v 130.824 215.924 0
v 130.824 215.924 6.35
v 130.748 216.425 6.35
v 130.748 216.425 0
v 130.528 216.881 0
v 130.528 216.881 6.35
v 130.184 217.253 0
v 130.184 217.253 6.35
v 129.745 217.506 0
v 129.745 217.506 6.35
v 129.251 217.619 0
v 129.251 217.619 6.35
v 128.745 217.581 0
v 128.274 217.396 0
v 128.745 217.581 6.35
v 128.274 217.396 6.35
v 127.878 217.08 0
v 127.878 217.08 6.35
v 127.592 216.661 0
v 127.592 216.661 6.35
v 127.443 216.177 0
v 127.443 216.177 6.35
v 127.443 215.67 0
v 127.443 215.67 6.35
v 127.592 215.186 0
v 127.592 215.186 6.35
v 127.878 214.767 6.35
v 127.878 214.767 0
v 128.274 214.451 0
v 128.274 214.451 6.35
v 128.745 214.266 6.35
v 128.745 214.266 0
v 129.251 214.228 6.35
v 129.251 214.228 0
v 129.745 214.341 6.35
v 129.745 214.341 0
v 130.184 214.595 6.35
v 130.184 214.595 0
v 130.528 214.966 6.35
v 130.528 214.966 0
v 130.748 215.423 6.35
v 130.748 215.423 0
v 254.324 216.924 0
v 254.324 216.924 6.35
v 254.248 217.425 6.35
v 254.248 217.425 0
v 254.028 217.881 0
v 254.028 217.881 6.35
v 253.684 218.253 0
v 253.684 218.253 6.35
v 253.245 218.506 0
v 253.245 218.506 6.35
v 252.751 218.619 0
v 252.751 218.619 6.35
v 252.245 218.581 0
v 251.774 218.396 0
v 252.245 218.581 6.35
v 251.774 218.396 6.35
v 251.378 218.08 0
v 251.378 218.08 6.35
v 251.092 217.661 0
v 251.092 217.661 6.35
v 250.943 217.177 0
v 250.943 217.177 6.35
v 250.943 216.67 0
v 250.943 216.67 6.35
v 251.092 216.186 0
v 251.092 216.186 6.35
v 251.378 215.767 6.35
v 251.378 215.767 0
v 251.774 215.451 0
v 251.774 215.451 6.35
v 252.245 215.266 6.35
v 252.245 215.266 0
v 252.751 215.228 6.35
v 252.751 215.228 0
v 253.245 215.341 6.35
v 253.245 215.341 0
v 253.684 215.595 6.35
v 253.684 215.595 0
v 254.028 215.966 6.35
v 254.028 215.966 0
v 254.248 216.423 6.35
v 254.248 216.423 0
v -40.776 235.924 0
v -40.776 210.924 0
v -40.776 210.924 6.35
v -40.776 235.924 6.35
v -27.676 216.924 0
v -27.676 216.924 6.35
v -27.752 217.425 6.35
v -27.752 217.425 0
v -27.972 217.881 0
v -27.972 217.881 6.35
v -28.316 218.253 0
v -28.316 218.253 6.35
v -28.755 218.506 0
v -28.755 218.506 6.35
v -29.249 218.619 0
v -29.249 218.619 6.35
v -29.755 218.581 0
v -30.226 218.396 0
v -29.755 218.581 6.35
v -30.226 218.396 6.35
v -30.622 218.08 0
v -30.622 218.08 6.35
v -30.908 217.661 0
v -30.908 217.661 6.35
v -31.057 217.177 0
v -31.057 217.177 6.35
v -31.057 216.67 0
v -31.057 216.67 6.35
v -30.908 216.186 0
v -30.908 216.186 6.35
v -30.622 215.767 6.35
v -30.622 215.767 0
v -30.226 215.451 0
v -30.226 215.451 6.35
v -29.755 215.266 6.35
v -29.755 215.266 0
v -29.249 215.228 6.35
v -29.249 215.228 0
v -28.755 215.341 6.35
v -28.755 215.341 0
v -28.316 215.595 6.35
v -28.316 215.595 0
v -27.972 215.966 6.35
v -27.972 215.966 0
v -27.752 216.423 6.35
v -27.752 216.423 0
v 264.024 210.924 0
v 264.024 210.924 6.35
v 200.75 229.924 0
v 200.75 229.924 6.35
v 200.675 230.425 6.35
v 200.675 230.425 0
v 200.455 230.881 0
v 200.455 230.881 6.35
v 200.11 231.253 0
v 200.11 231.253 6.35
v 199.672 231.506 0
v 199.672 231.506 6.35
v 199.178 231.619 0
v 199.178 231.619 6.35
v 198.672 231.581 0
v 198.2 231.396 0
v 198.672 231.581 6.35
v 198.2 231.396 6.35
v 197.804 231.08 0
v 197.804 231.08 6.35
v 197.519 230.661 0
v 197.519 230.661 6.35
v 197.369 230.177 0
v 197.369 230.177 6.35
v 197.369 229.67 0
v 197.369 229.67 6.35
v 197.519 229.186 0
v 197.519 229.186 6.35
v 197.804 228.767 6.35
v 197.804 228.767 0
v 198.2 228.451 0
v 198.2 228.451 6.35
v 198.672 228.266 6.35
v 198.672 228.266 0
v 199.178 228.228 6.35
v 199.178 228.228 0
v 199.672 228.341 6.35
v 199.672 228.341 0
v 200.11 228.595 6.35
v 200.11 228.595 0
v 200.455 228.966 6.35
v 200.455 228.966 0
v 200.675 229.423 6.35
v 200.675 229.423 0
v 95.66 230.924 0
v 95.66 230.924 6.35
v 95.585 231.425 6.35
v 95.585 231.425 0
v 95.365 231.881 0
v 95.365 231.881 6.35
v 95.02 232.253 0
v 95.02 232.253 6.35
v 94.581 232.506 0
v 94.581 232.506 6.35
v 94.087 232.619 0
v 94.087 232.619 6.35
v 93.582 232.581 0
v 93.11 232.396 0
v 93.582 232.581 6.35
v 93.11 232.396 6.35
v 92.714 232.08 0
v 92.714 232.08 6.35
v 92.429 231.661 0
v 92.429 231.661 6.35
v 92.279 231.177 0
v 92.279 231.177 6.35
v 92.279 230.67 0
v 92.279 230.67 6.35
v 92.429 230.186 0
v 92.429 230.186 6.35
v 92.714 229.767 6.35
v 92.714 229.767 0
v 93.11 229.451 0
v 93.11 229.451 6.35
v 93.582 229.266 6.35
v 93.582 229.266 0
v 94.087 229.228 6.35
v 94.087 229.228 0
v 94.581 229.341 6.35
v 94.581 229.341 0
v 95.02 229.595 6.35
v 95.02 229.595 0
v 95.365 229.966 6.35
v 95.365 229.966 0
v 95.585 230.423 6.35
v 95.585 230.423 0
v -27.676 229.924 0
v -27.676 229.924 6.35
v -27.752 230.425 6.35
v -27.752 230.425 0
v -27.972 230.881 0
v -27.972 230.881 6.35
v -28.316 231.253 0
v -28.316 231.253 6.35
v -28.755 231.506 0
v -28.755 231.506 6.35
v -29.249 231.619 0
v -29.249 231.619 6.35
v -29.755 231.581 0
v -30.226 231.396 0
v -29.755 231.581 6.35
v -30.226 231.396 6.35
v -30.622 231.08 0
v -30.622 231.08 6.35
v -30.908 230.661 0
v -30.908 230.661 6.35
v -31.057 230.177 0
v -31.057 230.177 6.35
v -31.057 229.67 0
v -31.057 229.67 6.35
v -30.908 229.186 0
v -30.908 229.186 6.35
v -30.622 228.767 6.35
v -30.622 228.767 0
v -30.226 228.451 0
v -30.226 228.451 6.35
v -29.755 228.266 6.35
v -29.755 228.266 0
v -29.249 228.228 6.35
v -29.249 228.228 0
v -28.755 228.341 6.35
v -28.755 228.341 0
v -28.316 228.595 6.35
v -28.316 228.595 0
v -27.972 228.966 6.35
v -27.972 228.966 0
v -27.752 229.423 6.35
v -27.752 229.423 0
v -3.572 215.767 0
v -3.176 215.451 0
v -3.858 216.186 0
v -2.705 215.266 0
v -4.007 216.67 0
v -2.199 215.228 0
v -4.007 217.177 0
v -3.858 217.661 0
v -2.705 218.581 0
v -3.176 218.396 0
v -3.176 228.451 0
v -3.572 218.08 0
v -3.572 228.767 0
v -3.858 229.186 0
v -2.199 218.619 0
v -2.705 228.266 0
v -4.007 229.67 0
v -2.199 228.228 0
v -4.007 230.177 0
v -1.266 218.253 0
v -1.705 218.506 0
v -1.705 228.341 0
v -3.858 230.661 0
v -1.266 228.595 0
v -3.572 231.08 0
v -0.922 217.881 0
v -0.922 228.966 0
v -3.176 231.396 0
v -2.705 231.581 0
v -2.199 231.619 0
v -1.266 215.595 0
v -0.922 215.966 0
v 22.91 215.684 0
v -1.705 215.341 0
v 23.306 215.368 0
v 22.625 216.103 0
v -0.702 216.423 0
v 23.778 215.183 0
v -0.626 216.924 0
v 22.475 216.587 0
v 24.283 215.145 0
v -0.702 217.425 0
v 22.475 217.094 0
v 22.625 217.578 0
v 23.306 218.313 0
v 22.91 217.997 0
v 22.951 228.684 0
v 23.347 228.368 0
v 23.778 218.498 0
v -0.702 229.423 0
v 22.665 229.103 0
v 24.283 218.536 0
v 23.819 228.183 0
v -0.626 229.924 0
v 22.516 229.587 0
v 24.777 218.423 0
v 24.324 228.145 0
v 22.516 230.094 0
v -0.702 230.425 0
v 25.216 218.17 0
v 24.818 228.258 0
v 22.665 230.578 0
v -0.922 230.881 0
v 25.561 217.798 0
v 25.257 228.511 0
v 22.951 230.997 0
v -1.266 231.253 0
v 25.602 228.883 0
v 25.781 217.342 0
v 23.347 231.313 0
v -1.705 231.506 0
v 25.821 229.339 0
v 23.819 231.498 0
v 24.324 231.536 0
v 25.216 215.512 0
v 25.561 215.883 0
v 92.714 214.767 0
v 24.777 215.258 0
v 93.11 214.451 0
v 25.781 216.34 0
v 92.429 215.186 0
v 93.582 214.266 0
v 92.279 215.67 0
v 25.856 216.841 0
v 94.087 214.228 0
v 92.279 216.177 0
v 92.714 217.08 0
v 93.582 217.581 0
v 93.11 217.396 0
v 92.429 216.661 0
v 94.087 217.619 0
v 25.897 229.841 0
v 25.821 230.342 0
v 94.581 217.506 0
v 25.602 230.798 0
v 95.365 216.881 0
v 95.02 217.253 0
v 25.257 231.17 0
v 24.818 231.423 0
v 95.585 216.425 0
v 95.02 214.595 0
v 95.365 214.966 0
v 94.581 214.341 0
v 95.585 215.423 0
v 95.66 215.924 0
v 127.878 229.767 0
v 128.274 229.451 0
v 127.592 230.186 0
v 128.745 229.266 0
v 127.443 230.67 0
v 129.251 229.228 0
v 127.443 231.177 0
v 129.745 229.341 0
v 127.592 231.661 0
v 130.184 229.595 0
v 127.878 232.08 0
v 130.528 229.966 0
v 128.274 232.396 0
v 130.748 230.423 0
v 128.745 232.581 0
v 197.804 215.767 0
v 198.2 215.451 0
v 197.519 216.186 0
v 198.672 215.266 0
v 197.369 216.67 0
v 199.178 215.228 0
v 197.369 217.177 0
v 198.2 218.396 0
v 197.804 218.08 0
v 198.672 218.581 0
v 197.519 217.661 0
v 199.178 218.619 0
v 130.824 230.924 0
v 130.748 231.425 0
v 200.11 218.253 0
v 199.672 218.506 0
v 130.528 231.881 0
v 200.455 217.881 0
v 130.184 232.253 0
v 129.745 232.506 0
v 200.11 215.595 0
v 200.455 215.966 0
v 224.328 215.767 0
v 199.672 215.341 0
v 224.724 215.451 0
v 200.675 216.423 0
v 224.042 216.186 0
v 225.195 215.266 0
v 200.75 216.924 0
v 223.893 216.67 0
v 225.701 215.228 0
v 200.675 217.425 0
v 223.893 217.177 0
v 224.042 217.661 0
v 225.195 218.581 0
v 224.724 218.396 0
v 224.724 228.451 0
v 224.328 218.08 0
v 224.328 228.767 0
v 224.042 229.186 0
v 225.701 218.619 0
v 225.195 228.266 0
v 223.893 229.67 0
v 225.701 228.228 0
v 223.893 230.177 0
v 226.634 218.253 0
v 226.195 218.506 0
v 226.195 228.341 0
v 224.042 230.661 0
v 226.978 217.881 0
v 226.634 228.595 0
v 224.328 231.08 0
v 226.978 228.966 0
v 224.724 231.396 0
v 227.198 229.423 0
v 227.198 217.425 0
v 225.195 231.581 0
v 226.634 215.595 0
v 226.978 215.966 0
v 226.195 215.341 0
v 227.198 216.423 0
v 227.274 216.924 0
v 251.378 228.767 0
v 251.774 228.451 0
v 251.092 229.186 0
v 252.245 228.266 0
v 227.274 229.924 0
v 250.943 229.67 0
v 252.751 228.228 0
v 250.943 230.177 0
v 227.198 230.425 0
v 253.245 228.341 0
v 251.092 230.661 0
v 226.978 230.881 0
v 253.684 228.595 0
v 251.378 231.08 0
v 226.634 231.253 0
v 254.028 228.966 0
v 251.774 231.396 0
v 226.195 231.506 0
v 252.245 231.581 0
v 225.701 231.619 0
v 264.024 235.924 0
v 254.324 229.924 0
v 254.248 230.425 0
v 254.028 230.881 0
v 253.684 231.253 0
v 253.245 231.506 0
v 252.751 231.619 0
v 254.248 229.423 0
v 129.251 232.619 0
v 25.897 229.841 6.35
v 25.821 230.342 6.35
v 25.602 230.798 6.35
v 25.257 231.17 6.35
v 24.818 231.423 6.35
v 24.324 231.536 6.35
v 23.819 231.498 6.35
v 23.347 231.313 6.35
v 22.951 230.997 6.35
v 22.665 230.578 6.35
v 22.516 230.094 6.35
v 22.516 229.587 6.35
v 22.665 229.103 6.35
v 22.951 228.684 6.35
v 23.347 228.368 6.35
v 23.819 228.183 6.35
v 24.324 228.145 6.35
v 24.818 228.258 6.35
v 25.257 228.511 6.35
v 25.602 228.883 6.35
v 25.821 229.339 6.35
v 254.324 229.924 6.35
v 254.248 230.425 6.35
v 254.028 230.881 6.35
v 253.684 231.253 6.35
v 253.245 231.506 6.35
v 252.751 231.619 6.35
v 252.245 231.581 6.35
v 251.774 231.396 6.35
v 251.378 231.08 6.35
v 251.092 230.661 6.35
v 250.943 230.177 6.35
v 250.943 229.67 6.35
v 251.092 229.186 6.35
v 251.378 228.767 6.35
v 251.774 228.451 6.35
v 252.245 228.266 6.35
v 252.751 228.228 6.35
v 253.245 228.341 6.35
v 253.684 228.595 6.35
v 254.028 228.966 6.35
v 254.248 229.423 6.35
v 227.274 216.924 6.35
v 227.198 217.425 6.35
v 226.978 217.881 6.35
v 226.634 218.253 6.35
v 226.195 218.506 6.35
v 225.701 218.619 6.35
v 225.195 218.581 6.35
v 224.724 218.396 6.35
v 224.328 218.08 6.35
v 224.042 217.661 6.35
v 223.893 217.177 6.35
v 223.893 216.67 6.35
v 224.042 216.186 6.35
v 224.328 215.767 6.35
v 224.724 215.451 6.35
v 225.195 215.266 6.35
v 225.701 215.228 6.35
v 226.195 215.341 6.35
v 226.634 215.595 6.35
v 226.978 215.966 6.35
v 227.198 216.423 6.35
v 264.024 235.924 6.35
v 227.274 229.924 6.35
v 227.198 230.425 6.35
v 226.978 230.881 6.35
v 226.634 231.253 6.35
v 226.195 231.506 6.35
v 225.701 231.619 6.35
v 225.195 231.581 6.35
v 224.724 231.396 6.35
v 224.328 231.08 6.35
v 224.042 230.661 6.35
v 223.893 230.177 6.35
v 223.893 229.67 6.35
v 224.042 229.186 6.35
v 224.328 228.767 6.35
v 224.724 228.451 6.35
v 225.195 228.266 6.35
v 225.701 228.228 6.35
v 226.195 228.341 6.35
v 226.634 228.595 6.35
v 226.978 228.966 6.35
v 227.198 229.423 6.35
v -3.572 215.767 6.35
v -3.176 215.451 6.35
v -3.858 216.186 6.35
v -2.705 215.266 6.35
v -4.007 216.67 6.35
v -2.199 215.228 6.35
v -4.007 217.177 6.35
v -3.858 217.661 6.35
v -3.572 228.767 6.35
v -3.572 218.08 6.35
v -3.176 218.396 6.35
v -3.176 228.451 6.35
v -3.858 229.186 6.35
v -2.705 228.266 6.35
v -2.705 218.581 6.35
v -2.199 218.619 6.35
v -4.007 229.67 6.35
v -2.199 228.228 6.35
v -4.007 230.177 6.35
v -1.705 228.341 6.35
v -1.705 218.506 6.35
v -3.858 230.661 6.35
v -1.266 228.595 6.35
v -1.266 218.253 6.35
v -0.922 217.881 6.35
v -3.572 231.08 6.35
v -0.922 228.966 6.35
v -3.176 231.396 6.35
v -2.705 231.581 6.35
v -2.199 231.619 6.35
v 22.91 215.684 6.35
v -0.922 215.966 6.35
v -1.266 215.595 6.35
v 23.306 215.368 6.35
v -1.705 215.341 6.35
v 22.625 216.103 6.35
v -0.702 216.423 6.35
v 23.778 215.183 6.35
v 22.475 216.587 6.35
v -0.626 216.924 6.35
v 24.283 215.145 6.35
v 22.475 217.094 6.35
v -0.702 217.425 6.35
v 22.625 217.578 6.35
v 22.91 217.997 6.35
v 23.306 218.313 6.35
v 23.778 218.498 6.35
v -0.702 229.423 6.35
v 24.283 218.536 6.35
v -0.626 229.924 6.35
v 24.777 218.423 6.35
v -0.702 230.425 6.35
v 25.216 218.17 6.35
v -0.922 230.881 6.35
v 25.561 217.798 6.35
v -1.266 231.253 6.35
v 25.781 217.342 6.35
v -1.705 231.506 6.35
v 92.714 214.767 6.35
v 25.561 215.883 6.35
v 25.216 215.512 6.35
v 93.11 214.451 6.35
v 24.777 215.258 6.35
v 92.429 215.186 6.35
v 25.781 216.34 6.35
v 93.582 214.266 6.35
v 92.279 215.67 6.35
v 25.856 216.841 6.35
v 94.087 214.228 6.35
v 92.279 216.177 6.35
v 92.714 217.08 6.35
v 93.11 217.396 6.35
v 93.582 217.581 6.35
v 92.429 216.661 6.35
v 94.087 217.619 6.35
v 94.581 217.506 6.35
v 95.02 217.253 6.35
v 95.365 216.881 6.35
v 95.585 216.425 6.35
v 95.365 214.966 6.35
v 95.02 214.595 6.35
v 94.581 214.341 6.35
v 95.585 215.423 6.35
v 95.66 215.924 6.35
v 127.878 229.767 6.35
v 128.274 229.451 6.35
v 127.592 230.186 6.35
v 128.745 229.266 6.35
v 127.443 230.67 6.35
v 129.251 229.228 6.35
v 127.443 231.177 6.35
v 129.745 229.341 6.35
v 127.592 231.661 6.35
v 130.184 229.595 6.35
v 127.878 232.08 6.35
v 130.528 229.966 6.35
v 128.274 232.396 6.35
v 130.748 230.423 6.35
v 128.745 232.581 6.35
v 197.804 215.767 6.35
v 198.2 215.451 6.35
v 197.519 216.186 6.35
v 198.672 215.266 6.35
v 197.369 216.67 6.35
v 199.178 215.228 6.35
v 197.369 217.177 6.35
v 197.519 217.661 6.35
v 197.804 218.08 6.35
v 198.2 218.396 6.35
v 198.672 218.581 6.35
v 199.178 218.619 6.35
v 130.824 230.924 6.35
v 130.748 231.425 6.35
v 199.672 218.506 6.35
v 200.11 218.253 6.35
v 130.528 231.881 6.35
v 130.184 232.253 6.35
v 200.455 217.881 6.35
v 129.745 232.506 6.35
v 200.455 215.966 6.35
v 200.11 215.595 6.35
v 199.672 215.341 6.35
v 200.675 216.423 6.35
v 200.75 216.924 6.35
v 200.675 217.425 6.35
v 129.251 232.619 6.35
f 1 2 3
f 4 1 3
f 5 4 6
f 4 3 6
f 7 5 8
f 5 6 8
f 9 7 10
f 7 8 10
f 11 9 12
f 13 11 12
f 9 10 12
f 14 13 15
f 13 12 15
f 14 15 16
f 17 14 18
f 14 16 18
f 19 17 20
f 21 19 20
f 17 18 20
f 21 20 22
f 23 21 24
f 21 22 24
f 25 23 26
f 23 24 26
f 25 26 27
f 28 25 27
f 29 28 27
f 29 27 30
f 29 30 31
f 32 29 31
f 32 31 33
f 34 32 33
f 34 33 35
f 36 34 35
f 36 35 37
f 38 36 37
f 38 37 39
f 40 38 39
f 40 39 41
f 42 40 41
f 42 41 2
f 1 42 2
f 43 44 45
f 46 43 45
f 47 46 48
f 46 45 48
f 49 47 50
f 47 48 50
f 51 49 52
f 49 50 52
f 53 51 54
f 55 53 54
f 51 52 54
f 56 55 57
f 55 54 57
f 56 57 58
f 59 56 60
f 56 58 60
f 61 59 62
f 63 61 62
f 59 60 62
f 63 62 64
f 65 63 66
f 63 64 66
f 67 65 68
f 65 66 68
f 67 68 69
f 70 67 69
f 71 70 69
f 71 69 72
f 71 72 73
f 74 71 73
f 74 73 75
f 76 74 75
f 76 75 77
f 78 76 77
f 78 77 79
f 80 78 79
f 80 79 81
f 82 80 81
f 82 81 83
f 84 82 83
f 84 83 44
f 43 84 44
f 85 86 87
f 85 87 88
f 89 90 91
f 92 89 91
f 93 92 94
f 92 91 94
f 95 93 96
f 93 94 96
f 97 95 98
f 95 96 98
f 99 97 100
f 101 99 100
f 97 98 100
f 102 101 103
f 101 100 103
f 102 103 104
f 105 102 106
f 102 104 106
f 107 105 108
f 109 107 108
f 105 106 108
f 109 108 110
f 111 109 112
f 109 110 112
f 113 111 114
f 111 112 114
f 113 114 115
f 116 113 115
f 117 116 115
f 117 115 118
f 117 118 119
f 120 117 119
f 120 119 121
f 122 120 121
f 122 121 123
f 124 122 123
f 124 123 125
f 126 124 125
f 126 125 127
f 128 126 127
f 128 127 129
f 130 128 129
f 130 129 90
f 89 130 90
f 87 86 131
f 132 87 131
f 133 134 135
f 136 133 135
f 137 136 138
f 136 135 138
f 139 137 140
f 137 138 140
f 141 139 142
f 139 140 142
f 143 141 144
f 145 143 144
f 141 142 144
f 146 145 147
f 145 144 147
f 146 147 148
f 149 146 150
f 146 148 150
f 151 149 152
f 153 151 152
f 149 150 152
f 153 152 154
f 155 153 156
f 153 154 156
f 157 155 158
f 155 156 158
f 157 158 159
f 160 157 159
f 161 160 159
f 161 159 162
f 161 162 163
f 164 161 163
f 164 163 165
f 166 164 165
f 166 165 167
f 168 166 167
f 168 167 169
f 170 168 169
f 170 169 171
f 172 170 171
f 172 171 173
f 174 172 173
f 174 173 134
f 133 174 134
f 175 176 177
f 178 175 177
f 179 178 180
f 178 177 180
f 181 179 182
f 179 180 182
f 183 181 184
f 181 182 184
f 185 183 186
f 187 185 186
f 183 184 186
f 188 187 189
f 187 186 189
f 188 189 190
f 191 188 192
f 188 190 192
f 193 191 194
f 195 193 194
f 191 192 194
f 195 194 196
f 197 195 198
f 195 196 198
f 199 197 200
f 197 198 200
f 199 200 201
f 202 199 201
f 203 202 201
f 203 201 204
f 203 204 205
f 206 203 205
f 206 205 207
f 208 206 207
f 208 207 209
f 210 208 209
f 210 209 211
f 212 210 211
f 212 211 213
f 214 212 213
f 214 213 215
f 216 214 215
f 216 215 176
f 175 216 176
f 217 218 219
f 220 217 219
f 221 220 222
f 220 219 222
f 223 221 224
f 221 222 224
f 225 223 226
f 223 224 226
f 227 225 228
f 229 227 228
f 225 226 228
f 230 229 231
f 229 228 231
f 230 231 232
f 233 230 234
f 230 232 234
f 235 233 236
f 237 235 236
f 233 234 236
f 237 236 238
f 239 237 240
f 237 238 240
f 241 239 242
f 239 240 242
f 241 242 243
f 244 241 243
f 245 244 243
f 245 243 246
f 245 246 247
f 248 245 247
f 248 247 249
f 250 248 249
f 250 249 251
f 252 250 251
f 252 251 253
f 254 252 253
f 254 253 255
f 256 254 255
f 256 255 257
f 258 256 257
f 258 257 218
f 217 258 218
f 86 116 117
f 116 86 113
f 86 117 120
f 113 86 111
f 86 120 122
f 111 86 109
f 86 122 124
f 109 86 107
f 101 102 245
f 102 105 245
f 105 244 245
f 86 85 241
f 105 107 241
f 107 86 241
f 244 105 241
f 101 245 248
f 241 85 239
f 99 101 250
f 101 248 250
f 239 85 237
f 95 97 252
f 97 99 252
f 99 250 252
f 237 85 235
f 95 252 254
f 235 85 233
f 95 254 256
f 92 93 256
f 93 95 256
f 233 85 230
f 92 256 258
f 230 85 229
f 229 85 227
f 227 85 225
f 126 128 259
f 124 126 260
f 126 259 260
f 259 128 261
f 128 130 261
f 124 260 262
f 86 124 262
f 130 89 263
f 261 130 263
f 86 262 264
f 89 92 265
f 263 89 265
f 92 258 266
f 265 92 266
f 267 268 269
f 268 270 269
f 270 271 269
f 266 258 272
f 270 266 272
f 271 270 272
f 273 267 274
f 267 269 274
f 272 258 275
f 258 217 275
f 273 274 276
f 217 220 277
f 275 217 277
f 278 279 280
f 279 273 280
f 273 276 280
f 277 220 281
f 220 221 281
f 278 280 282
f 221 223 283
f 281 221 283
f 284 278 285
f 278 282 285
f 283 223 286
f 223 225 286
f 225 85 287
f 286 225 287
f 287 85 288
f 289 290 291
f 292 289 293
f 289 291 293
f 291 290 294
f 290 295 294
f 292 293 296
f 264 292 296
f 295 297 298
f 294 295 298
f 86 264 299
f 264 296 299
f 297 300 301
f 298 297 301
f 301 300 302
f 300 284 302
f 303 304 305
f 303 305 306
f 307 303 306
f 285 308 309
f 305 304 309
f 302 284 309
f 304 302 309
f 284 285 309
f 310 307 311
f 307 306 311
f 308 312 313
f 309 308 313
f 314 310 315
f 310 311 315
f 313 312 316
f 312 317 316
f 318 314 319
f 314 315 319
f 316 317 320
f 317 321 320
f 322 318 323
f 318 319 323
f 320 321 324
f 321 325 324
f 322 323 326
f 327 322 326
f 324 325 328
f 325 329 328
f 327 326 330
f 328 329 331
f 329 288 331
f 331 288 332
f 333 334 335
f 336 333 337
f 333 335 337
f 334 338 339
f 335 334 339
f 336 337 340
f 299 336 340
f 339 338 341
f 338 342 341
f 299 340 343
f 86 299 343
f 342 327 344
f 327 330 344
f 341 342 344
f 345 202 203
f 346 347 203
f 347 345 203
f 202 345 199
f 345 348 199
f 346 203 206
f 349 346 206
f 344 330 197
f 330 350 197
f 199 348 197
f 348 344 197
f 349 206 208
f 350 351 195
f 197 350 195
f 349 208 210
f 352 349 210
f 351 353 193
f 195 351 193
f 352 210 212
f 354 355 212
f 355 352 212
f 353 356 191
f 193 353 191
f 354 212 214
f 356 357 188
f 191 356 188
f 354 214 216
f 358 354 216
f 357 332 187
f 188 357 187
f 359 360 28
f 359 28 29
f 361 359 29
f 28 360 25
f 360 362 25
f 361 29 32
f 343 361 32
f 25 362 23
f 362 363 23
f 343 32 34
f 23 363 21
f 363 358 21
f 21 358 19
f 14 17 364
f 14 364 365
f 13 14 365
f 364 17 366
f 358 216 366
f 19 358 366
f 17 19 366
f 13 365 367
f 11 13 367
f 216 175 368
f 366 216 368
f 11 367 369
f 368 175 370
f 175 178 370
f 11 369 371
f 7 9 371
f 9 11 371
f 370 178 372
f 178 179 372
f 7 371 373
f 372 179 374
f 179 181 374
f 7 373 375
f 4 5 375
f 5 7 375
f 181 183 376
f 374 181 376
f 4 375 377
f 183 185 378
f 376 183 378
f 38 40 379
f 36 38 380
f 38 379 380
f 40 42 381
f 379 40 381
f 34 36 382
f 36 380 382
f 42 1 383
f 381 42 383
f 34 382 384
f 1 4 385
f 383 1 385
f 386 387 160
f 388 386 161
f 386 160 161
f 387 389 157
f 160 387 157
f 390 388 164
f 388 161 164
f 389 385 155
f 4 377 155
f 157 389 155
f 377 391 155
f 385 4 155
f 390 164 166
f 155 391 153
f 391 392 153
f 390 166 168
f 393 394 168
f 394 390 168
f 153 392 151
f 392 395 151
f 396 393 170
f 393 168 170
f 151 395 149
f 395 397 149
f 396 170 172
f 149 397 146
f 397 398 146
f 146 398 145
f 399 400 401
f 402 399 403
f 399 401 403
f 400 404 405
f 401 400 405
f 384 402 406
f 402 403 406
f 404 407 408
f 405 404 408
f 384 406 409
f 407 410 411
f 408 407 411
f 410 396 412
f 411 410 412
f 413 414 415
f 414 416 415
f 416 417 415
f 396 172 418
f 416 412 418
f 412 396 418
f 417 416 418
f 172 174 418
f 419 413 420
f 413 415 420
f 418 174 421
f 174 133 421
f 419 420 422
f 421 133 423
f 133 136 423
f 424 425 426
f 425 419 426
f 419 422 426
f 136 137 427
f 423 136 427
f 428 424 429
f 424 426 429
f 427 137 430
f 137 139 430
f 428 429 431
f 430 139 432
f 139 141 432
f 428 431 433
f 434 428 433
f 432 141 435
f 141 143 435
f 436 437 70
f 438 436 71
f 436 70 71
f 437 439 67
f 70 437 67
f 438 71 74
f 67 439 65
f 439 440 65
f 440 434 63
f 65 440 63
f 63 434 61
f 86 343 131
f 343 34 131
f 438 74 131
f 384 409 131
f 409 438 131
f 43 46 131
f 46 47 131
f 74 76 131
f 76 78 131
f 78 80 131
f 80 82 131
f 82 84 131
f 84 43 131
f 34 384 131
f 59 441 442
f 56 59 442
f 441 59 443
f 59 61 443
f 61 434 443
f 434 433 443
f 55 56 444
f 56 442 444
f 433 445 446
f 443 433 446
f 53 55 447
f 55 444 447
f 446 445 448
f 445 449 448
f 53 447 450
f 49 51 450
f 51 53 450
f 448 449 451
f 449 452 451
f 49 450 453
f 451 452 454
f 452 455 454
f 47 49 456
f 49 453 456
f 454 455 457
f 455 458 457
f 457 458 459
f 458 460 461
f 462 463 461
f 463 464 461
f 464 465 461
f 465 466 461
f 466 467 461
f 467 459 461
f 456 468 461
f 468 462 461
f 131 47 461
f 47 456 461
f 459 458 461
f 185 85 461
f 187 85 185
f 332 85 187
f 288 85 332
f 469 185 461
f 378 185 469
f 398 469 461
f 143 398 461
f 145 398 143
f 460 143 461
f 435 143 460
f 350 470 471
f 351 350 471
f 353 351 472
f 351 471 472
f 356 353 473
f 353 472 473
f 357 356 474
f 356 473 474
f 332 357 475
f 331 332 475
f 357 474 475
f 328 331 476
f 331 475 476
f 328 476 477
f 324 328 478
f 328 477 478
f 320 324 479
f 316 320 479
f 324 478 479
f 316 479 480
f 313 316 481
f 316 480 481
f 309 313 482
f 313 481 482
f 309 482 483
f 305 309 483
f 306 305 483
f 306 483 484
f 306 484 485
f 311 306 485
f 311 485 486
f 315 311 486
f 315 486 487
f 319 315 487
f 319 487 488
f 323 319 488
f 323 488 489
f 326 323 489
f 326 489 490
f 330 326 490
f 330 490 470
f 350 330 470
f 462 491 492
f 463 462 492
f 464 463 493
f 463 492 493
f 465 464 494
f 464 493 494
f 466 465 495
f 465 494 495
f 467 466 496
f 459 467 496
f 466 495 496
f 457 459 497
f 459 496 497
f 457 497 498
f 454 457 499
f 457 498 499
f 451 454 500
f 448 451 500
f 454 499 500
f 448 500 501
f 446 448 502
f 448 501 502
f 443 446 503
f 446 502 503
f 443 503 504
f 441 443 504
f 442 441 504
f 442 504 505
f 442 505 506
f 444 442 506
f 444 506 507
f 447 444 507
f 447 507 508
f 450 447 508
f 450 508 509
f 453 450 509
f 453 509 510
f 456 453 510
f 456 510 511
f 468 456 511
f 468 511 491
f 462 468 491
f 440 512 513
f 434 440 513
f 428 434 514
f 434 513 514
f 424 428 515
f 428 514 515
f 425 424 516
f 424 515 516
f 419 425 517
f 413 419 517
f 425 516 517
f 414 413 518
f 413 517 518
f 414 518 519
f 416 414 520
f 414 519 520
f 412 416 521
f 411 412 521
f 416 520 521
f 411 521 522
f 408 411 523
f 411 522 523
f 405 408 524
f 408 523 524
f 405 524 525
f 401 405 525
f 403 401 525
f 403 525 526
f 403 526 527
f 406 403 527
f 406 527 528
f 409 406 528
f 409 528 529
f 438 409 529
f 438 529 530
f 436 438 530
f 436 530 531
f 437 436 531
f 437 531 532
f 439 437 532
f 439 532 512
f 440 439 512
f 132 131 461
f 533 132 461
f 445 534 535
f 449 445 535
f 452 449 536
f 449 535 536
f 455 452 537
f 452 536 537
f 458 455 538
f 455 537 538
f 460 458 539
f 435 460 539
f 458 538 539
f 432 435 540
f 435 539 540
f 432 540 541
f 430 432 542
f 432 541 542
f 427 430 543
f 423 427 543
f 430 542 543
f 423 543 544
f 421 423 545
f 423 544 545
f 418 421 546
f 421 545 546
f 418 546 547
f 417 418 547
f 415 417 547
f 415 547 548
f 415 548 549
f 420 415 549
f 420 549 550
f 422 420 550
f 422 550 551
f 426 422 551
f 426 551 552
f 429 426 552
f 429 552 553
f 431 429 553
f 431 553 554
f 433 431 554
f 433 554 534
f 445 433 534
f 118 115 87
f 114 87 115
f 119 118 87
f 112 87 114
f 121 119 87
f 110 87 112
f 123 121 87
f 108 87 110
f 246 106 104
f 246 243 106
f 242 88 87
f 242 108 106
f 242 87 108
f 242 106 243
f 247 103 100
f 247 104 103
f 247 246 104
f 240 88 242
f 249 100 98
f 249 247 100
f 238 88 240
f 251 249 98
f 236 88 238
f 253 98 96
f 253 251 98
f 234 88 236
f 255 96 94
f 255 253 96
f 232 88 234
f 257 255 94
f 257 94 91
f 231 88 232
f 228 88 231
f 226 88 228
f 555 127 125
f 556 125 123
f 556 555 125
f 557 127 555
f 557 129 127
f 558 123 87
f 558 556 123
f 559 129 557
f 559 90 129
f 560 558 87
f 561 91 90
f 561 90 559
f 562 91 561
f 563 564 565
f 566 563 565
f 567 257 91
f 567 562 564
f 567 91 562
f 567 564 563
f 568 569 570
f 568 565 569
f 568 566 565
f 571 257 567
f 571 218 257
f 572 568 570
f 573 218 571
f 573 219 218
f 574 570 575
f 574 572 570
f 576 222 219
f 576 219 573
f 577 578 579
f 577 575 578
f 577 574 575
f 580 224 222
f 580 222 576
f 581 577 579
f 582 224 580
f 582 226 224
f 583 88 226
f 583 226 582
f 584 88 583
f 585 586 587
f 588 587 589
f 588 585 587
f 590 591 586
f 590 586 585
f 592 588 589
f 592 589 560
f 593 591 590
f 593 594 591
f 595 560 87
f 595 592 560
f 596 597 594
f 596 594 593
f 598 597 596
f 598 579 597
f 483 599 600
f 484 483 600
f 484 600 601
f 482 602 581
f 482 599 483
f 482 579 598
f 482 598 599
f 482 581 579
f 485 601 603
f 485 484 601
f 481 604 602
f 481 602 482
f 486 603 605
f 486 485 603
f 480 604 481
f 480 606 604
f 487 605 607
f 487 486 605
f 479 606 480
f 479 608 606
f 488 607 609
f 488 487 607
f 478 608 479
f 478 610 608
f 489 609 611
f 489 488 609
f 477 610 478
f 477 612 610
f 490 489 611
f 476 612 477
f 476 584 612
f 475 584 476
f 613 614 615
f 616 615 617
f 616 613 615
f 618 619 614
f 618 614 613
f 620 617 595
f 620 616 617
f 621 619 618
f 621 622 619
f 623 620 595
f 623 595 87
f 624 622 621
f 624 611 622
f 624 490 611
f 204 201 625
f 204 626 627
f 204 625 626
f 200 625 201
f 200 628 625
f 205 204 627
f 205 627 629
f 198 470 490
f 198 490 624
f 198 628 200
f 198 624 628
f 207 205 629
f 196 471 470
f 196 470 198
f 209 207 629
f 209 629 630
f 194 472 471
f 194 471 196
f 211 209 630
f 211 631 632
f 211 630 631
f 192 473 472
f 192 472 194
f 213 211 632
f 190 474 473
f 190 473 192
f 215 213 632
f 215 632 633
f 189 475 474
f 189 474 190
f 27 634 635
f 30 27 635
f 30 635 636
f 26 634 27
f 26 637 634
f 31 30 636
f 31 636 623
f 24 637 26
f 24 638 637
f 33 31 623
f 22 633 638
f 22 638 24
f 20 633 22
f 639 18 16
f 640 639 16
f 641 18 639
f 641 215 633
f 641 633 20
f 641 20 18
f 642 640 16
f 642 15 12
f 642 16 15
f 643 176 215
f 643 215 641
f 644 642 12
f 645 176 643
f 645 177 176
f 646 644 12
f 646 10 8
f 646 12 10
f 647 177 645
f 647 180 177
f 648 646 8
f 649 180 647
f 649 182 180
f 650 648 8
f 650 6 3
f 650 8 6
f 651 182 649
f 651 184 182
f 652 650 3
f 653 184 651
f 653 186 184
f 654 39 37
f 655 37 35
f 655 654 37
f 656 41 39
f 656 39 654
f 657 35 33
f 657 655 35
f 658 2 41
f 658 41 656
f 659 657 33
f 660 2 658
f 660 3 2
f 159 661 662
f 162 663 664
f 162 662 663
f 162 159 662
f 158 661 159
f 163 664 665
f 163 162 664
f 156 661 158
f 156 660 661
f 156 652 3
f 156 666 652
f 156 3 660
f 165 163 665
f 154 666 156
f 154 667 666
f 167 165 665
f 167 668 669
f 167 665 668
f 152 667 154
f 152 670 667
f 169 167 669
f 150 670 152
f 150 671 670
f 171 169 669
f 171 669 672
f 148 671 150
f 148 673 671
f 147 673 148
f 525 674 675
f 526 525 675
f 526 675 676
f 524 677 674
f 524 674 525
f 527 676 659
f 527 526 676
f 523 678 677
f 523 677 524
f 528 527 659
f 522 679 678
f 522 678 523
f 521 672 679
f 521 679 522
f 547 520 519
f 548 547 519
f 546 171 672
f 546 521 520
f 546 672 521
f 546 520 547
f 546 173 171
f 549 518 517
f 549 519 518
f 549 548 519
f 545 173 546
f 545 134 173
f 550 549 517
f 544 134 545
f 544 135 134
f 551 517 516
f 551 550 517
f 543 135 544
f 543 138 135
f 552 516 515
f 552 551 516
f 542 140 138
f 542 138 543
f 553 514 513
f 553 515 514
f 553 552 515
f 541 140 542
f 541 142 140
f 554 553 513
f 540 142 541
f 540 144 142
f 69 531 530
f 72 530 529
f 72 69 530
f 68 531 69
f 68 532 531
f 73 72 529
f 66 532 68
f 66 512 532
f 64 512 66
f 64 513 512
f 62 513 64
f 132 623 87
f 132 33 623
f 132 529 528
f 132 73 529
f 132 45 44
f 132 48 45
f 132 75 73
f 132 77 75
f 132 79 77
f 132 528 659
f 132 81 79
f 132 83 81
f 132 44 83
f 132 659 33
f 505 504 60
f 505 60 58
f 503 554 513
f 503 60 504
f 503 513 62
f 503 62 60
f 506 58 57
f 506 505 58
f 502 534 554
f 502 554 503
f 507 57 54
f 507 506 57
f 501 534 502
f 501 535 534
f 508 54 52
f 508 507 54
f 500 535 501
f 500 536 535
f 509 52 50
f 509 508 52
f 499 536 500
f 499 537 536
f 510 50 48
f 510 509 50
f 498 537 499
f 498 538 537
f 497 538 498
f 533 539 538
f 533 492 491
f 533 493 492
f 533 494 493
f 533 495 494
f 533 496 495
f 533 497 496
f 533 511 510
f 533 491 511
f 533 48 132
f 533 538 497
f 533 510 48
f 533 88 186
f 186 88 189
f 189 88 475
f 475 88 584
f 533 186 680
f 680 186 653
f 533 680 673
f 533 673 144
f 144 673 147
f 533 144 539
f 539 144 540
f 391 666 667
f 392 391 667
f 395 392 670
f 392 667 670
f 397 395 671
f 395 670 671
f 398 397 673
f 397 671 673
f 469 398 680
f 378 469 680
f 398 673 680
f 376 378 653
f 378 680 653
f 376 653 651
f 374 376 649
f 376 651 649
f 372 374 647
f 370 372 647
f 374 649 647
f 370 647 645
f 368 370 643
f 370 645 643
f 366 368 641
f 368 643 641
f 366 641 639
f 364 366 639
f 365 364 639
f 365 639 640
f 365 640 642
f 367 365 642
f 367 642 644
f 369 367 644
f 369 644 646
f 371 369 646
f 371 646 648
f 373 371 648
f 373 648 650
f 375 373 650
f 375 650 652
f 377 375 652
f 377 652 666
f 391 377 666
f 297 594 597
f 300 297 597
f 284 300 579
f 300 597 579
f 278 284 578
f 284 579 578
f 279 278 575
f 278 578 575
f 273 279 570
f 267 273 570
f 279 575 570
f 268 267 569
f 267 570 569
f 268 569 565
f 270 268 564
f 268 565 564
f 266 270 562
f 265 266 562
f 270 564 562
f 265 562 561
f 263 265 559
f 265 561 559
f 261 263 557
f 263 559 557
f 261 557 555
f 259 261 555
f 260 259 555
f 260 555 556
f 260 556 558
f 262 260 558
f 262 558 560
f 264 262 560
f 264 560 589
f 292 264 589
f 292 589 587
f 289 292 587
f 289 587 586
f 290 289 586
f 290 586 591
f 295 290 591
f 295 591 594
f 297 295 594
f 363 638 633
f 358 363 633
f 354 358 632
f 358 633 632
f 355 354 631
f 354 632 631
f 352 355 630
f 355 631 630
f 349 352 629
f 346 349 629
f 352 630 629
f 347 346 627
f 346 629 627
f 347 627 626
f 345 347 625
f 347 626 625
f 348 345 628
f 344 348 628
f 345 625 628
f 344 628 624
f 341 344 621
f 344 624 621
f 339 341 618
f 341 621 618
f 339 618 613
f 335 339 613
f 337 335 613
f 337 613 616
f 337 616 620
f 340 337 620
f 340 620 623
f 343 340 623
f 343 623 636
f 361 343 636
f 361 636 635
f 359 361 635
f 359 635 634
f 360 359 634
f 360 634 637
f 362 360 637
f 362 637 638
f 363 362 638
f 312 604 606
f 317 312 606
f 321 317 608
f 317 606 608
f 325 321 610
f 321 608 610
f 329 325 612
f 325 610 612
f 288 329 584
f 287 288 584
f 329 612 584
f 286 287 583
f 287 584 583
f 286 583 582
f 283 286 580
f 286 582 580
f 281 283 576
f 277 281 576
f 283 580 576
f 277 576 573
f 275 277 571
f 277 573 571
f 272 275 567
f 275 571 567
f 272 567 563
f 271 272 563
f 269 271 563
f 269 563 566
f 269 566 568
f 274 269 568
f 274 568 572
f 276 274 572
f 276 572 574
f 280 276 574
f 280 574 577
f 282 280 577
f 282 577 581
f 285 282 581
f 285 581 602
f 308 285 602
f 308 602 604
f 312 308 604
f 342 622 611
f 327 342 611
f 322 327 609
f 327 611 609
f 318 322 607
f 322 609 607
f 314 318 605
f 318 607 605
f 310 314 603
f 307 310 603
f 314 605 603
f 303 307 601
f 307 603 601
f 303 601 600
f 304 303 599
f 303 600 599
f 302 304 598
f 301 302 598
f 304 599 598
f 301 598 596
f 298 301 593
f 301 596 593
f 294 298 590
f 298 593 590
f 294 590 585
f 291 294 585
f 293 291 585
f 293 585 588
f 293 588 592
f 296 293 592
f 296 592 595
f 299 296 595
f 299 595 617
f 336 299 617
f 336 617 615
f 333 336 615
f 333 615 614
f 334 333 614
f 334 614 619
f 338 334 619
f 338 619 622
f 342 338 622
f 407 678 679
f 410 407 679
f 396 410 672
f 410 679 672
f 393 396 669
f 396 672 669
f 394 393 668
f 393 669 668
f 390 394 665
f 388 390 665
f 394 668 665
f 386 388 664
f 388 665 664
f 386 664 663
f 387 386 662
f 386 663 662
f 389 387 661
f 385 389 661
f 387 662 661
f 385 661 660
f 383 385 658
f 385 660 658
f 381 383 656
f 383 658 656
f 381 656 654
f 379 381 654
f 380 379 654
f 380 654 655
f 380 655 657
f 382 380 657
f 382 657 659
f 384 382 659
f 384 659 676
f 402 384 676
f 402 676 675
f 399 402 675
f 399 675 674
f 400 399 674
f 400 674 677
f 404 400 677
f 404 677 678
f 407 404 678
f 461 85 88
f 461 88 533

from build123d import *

# Parameters (mm, degrees)
SKETCH1_W           = 304.8
SKETCH1_H           = 25
BOSS_EXTRUDE1_DEPTH = 6.35
SKETCH2_R           = 1.7
CUT_EXTRUDE1_DEPTH  = 10
SKETCH3_R           = 1.7
CUT_EXTRUDE2_DEPTH  = 22


with BuildPart() as part:
    # Sketch1 → Boss-Extrude1 (new body)
    with BuildSketch(Plane.XY):
        with Locations((111.623766163, 223.42362241)):
            Rectangle(SKETCH1_W, SKETCH1_H)
    extrude(amount=BOSS_EXTRUDE1_DEPTH)

    # Sketch2 → Cut-Extrude1 (cut)
    with BuildSketch(Plane.XY.offset(6.35)):
        with Locations((225.573766163, 216.92362241)):
            Circle(SKETCH2_R)
        with Locations((225.573766163, 229.92362241)):
            Circle(SKETCH2_R)
        with Locations((252.623766163, 229.92362241)):
            Circle(SKETCH2_R)
        with Locations((252.623766163, 216.92362241)):
            Circle(SKETCH2_R)
        with Locations((-2.326233837, 216.92362241)):
            Circle(SKETCH2_R)
        with Locations((-29.376233837, 216.92362241)):
            Circle(SKETCH2_R)
        with Locations((-29.376233837, 229.92362241)):
            Circle(SKETCH2_R)
        with Locations((-2.326233837, 229.92362241)):
            Circle(SKETCH2_R)
    extrude(amount=-CUT_EXTRUDE1_DEPTH, mode=Mode.SUBTRACT)

    # Sketch3 → Cut-Extrude2 (cut)
    with BuildSketch(Plane.XY.offset(6.35)):
        with Locations((225.573766163, 216.92362241)):
            Circle(SKETCH3_R)
        with Locations((225.573766163, 229.92362241)):
            Circle(SKETCH3_R)
        with Locations((199.050473293, 216.92362241)):
            Circle(SKETCH3_R)
        with Locations((199.050473293, 229.92362241)):
            Circle(SKETCH3_R)
        with Locations((129.123766163, 215.92362241)):
            Circle(SKETCH3_R)
        with Locations((129.123766163, 230.92362241)):
            Circle(SKETCH3_R)
        with Locations((93.960167873, 215.92362241)):
            Circle(SKETCH3_R)
        with Locations((93.960167873, 230.92362241)):
            Circle(SKETCH3_R)
        with Locations((24.196928947, 229.840552731)):
            Circle(SKETCH3_R)
        with Locations((24.156213572, 216.84061649)):
            Circle(SKETCH3_R)
    extrude(amount=-CUT_EXTRUDE2_DEPTH, mode=Mode.SUBTRACT)


solid = part.part
